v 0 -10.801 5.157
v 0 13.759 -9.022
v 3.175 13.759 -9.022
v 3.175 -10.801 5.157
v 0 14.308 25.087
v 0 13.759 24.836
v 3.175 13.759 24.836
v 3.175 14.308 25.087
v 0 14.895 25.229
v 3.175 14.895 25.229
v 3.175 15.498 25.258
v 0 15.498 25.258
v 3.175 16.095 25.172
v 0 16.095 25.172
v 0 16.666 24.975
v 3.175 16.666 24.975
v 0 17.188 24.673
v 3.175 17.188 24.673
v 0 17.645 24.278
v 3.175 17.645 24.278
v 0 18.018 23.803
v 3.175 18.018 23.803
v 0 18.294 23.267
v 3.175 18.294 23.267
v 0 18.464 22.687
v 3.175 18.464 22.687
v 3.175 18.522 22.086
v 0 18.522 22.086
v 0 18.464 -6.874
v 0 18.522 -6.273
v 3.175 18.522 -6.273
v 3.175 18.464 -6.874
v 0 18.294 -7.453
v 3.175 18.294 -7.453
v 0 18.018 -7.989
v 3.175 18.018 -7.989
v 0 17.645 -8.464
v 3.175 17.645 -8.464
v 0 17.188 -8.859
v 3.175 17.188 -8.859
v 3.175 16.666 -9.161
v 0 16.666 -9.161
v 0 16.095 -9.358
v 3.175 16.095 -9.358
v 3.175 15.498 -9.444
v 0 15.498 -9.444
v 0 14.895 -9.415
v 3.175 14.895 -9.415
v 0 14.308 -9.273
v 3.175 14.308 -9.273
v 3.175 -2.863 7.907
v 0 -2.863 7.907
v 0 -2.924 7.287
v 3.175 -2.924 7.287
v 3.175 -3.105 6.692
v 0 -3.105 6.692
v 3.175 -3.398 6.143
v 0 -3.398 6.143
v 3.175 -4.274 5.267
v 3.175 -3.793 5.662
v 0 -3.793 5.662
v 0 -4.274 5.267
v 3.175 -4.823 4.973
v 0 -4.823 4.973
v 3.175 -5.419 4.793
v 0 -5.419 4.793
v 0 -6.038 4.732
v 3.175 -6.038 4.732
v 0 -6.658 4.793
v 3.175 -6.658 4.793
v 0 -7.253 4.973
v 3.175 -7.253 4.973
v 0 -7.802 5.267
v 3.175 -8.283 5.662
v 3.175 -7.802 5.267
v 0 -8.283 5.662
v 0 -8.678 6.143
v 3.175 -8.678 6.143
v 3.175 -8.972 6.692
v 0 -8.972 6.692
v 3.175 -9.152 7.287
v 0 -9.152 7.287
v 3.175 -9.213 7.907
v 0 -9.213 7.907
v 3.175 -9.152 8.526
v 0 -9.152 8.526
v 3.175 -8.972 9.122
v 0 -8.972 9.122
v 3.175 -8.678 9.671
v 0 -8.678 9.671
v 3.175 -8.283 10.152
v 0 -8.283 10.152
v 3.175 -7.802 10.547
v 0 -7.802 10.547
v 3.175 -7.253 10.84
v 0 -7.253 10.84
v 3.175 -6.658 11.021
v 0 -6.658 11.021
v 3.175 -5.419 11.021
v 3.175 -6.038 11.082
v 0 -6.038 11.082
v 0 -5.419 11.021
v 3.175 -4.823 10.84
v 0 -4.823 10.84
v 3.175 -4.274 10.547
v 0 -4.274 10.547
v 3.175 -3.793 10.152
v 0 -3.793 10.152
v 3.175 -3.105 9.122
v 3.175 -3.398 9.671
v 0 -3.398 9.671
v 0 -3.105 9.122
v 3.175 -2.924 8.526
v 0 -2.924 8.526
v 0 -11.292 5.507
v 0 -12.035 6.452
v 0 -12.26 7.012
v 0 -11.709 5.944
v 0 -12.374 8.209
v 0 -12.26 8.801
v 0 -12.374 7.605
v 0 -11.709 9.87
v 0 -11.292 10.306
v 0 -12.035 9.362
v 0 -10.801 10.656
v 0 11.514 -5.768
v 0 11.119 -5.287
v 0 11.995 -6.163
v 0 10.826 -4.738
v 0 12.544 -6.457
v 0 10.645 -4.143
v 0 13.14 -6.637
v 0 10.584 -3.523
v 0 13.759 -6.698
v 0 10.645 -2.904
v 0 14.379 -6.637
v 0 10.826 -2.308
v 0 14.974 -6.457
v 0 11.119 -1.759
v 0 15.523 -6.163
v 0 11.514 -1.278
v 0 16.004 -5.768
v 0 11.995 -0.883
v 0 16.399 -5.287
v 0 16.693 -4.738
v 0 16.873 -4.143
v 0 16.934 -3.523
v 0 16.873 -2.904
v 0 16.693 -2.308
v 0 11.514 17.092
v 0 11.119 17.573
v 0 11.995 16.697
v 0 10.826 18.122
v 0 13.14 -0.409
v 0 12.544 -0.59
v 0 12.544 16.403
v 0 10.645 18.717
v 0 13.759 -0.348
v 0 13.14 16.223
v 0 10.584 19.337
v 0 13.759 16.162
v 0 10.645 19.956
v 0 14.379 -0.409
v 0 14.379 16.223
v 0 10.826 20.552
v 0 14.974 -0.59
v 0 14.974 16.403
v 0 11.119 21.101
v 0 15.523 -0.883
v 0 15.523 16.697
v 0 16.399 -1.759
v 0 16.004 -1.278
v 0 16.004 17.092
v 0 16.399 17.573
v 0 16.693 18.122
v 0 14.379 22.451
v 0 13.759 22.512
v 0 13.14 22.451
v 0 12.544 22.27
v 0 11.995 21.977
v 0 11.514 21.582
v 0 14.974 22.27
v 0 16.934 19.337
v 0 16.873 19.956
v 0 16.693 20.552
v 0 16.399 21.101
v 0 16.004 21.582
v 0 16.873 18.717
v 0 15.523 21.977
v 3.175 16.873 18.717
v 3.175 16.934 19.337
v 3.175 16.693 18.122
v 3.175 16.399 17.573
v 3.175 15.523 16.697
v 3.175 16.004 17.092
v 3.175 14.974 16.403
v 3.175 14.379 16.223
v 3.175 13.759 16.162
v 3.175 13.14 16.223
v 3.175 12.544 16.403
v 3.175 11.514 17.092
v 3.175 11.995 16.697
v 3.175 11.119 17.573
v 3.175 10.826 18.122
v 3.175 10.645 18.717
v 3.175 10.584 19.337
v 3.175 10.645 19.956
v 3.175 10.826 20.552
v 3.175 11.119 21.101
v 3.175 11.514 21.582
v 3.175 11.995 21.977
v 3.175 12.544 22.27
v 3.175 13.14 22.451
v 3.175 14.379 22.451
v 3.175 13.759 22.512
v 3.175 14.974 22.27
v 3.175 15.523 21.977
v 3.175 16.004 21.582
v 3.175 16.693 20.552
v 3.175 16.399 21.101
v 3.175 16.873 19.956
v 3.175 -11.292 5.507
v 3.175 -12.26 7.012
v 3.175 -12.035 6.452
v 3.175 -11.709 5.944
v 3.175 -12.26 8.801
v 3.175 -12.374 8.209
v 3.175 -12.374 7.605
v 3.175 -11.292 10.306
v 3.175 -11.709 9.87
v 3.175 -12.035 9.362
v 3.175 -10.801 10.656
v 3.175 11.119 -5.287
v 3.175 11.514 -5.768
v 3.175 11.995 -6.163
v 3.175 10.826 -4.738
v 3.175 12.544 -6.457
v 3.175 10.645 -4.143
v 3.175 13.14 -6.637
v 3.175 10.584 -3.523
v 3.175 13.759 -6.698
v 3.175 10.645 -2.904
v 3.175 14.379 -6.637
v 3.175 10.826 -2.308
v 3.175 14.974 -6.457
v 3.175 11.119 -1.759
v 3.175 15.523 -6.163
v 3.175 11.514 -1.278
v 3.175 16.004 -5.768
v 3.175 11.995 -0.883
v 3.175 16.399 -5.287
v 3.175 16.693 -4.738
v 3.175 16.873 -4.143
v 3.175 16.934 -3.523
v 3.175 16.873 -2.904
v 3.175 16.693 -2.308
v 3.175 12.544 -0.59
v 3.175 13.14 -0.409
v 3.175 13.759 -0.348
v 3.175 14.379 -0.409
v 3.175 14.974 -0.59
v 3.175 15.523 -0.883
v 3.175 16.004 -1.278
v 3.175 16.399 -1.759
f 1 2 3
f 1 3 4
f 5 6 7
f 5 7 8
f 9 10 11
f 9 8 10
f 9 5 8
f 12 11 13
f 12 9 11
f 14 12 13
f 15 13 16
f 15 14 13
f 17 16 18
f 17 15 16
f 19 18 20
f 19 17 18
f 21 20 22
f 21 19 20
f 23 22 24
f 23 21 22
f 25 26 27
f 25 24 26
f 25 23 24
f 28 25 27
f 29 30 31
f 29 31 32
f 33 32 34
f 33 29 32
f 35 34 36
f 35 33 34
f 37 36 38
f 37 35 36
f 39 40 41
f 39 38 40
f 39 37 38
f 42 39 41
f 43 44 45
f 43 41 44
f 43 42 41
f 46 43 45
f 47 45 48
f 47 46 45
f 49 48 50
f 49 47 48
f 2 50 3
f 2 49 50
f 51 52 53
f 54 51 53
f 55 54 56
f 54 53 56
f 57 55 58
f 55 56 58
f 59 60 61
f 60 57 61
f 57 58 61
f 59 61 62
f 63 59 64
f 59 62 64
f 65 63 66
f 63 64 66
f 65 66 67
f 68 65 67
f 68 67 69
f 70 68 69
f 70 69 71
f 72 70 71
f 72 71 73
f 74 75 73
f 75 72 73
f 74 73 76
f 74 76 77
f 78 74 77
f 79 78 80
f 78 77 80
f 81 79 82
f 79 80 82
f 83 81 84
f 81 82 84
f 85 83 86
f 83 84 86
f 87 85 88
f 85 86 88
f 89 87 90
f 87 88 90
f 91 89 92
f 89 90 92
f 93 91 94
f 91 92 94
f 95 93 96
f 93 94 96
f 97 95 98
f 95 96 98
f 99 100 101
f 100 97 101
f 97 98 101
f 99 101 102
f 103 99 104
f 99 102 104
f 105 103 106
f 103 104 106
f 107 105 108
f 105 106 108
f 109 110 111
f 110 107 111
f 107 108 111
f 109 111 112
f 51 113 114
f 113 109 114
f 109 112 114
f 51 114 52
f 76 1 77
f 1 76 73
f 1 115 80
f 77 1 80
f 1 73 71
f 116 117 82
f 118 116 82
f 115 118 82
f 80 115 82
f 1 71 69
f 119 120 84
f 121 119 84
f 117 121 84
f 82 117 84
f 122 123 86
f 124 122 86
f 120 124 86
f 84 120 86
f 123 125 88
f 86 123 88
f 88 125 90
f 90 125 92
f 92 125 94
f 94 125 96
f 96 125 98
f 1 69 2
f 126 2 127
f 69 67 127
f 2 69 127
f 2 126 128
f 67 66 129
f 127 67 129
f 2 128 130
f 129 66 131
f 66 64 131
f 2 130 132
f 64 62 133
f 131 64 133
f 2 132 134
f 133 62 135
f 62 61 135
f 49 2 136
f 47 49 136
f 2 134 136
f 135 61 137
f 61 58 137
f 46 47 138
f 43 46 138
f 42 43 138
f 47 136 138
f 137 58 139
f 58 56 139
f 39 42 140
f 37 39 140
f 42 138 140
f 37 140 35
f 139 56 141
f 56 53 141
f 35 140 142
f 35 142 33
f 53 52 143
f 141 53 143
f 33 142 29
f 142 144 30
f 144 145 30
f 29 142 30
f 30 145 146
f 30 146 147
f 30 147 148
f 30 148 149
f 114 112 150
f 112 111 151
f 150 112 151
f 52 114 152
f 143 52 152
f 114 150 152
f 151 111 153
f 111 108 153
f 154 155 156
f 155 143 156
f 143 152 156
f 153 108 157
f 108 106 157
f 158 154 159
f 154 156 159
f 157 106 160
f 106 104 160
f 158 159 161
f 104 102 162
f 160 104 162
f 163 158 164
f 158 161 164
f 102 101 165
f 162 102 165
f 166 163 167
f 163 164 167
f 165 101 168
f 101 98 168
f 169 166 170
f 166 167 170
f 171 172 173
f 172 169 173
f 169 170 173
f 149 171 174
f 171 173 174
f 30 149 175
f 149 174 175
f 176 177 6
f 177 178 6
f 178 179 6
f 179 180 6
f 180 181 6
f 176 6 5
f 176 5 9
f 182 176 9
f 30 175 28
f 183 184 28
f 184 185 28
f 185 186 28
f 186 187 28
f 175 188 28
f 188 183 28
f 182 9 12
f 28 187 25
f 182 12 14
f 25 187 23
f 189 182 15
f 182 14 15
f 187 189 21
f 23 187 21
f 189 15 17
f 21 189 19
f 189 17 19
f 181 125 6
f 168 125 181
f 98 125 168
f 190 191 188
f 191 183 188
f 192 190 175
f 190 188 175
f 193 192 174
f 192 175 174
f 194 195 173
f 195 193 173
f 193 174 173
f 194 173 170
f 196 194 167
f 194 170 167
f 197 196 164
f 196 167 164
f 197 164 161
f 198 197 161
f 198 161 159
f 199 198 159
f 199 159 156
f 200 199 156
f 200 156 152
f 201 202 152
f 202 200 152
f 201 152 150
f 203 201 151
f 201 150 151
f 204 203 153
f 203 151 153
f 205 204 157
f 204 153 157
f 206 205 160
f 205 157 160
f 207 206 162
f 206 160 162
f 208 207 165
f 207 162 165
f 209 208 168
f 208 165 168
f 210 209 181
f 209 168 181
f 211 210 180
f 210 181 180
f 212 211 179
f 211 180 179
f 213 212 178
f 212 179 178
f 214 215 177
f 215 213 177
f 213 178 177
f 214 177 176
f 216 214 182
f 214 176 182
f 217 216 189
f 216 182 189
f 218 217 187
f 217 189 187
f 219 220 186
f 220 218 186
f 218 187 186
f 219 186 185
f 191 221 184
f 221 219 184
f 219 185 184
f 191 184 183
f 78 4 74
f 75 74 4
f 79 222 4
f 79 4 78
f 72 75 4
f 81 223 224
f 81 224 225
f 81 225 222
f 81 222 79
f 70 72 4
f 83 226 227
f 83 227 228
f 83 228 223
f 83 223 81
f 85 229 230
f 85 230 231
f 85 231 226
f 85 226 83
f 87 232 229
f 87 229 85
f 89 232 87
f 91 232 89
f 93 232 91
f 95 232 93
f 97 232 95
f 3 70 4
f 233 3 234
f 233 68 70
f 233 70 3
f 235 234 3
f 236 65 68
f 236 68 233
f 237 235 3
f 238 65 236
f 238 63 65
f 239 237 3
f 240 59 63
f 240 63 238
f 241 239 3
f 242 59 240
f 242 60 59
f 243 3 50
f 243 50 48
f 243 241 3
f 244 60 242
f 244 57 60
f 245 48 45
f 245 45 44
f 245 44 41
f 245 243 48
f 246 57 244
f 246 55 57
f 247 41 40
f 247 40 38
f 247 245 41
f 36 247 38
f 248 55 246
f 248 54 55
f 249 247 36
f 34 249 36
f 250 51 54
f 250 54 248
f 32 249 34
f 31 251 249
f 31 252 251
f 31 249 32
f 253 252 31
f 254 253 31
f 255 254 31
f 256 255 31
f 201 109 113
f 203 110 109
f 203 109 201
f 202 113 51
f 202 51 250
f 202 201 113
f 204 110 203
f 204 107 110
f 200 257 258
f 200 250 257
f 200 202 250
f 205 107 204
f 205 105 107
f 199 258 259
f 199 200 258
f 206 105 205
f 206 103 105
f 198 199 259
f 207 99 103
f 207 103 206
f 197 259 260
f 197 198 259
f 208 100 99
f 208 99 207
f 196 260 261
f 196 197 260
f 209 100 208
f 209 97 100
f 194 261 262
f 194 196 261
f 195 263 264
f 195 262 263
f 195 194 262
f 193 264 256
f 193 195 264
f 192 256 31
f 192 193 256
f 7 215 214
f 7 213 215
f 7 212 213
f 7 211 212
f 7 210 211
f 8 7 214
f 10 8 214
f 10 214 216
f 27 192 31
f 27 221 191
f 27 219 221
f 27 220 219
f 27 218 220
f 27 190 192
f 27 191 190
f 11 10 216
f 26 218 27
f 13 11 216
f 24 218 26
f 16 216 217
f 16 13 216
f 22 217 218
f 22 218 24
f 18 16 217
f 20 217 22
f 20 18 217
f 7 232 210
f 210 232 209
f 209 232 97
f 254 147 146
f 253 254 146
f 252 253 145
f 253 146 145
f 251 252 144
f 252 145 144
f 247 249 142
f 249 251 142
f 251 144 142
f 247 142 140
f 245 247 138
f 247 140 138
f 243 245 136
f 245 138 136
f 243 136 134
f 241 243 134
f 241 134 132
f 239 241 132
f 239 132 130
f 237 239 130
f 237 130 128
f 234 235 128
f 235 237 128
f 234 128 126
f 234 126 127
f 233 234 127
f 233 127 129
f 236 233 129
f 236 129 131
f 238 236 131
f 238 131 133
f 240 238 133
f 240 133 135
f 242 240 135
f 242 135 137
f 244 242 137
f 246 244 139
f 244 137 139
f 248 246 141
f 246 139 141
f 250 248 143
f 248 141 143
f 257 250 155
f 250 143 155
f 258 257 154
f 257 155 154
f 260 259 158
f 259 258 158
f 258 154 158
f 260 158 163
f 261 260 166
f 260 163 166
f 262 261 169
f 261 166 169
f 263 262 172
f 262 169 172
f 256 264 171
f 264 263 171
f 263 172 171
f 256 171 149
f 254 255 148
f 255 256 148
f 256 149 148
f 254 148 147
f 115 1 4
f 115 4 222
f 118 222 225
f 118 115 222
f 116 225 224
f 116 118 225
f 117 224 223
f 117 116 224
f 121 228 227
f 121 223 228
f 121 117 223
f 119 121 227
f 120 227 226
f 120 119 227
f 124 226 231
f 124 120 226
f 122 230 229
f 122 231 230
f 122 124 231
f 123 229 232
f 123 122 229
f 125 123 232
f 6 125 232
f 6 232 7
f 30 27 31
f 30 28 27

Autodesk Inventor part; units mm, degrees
ref_plane "YZ Plane" through (0, 0, 0) normal (1, 0, 0) x (0, 1, 0)
ref_plane "XZ Plane" through (0, 0, 0) normal (0, 1, 0) x (-1, 0, 0)
ref_plane "XY Plane" through (0, 0, 0) normal (0, 0, 1) x (1, 0, 0)
sketch "Sketch1" plane through (0, 0, 0) normal (1, 0, 0) x (0, 1, 0)
  line L0 (13.7592, -3.5232) -> (-6.0382, 7.9068) construction
  line L1 (-6.0382, 7.9068) -> (13.7592, 19.3368) construction
  line L2 (13.7592, 19.3368) -> (13.7592, -3.5232) construction
  circle A0 centre (13.7592, 19.3368) radius 3.175
  circle A1 centre (13.7592, -3.5232) radius 3.175
  circle A2 centre (-6.0382, 7.9068) radius 3.175
  line L3 (-6.0382, 7.9068) -> (-15.5632, 7.9068) construction
  line L4 (-10.8007, 10.6565) -> (13.7592, 24.8361)
  line L5 (18.5217, 22.0865) -> (18.5217, -6.2728)
  line L6 (13.7592, -9.0224) -> (-10.8007, 5.1572)
  arc A3 (18.5217, 22.0865) -> (13.7592, 24.8361) centre (15.3467, 22.0865) ccw
  arc A4 (-10.8007, 10.6565) -> (-10.8007, 5.1572) centre (-9.2132, 7.9068) ccw
  arc A5 (13.7592, -9.0224) -> (18.5217, -6.2728) centre (15.3467, -6.2728) ccw
  point P0 (7.1601, 7.9068)
  point P1 (7.1601, 7.9068)
  point P2 (18.5217, 27.5857)
  point P3 (18.5217, -11.7721)
  dimension "d7" = 22.86
  dimension "d8" = 6.35
  dimension "d9" = 6.35
  dimension "d10" = 6.35
  dimension "d11" = 9.525
  dimension "d12" = 3.175
extrude "Extrusion1" add sketch "Sketch1" along normal blind 3.175
properties part number "arm4_3"
